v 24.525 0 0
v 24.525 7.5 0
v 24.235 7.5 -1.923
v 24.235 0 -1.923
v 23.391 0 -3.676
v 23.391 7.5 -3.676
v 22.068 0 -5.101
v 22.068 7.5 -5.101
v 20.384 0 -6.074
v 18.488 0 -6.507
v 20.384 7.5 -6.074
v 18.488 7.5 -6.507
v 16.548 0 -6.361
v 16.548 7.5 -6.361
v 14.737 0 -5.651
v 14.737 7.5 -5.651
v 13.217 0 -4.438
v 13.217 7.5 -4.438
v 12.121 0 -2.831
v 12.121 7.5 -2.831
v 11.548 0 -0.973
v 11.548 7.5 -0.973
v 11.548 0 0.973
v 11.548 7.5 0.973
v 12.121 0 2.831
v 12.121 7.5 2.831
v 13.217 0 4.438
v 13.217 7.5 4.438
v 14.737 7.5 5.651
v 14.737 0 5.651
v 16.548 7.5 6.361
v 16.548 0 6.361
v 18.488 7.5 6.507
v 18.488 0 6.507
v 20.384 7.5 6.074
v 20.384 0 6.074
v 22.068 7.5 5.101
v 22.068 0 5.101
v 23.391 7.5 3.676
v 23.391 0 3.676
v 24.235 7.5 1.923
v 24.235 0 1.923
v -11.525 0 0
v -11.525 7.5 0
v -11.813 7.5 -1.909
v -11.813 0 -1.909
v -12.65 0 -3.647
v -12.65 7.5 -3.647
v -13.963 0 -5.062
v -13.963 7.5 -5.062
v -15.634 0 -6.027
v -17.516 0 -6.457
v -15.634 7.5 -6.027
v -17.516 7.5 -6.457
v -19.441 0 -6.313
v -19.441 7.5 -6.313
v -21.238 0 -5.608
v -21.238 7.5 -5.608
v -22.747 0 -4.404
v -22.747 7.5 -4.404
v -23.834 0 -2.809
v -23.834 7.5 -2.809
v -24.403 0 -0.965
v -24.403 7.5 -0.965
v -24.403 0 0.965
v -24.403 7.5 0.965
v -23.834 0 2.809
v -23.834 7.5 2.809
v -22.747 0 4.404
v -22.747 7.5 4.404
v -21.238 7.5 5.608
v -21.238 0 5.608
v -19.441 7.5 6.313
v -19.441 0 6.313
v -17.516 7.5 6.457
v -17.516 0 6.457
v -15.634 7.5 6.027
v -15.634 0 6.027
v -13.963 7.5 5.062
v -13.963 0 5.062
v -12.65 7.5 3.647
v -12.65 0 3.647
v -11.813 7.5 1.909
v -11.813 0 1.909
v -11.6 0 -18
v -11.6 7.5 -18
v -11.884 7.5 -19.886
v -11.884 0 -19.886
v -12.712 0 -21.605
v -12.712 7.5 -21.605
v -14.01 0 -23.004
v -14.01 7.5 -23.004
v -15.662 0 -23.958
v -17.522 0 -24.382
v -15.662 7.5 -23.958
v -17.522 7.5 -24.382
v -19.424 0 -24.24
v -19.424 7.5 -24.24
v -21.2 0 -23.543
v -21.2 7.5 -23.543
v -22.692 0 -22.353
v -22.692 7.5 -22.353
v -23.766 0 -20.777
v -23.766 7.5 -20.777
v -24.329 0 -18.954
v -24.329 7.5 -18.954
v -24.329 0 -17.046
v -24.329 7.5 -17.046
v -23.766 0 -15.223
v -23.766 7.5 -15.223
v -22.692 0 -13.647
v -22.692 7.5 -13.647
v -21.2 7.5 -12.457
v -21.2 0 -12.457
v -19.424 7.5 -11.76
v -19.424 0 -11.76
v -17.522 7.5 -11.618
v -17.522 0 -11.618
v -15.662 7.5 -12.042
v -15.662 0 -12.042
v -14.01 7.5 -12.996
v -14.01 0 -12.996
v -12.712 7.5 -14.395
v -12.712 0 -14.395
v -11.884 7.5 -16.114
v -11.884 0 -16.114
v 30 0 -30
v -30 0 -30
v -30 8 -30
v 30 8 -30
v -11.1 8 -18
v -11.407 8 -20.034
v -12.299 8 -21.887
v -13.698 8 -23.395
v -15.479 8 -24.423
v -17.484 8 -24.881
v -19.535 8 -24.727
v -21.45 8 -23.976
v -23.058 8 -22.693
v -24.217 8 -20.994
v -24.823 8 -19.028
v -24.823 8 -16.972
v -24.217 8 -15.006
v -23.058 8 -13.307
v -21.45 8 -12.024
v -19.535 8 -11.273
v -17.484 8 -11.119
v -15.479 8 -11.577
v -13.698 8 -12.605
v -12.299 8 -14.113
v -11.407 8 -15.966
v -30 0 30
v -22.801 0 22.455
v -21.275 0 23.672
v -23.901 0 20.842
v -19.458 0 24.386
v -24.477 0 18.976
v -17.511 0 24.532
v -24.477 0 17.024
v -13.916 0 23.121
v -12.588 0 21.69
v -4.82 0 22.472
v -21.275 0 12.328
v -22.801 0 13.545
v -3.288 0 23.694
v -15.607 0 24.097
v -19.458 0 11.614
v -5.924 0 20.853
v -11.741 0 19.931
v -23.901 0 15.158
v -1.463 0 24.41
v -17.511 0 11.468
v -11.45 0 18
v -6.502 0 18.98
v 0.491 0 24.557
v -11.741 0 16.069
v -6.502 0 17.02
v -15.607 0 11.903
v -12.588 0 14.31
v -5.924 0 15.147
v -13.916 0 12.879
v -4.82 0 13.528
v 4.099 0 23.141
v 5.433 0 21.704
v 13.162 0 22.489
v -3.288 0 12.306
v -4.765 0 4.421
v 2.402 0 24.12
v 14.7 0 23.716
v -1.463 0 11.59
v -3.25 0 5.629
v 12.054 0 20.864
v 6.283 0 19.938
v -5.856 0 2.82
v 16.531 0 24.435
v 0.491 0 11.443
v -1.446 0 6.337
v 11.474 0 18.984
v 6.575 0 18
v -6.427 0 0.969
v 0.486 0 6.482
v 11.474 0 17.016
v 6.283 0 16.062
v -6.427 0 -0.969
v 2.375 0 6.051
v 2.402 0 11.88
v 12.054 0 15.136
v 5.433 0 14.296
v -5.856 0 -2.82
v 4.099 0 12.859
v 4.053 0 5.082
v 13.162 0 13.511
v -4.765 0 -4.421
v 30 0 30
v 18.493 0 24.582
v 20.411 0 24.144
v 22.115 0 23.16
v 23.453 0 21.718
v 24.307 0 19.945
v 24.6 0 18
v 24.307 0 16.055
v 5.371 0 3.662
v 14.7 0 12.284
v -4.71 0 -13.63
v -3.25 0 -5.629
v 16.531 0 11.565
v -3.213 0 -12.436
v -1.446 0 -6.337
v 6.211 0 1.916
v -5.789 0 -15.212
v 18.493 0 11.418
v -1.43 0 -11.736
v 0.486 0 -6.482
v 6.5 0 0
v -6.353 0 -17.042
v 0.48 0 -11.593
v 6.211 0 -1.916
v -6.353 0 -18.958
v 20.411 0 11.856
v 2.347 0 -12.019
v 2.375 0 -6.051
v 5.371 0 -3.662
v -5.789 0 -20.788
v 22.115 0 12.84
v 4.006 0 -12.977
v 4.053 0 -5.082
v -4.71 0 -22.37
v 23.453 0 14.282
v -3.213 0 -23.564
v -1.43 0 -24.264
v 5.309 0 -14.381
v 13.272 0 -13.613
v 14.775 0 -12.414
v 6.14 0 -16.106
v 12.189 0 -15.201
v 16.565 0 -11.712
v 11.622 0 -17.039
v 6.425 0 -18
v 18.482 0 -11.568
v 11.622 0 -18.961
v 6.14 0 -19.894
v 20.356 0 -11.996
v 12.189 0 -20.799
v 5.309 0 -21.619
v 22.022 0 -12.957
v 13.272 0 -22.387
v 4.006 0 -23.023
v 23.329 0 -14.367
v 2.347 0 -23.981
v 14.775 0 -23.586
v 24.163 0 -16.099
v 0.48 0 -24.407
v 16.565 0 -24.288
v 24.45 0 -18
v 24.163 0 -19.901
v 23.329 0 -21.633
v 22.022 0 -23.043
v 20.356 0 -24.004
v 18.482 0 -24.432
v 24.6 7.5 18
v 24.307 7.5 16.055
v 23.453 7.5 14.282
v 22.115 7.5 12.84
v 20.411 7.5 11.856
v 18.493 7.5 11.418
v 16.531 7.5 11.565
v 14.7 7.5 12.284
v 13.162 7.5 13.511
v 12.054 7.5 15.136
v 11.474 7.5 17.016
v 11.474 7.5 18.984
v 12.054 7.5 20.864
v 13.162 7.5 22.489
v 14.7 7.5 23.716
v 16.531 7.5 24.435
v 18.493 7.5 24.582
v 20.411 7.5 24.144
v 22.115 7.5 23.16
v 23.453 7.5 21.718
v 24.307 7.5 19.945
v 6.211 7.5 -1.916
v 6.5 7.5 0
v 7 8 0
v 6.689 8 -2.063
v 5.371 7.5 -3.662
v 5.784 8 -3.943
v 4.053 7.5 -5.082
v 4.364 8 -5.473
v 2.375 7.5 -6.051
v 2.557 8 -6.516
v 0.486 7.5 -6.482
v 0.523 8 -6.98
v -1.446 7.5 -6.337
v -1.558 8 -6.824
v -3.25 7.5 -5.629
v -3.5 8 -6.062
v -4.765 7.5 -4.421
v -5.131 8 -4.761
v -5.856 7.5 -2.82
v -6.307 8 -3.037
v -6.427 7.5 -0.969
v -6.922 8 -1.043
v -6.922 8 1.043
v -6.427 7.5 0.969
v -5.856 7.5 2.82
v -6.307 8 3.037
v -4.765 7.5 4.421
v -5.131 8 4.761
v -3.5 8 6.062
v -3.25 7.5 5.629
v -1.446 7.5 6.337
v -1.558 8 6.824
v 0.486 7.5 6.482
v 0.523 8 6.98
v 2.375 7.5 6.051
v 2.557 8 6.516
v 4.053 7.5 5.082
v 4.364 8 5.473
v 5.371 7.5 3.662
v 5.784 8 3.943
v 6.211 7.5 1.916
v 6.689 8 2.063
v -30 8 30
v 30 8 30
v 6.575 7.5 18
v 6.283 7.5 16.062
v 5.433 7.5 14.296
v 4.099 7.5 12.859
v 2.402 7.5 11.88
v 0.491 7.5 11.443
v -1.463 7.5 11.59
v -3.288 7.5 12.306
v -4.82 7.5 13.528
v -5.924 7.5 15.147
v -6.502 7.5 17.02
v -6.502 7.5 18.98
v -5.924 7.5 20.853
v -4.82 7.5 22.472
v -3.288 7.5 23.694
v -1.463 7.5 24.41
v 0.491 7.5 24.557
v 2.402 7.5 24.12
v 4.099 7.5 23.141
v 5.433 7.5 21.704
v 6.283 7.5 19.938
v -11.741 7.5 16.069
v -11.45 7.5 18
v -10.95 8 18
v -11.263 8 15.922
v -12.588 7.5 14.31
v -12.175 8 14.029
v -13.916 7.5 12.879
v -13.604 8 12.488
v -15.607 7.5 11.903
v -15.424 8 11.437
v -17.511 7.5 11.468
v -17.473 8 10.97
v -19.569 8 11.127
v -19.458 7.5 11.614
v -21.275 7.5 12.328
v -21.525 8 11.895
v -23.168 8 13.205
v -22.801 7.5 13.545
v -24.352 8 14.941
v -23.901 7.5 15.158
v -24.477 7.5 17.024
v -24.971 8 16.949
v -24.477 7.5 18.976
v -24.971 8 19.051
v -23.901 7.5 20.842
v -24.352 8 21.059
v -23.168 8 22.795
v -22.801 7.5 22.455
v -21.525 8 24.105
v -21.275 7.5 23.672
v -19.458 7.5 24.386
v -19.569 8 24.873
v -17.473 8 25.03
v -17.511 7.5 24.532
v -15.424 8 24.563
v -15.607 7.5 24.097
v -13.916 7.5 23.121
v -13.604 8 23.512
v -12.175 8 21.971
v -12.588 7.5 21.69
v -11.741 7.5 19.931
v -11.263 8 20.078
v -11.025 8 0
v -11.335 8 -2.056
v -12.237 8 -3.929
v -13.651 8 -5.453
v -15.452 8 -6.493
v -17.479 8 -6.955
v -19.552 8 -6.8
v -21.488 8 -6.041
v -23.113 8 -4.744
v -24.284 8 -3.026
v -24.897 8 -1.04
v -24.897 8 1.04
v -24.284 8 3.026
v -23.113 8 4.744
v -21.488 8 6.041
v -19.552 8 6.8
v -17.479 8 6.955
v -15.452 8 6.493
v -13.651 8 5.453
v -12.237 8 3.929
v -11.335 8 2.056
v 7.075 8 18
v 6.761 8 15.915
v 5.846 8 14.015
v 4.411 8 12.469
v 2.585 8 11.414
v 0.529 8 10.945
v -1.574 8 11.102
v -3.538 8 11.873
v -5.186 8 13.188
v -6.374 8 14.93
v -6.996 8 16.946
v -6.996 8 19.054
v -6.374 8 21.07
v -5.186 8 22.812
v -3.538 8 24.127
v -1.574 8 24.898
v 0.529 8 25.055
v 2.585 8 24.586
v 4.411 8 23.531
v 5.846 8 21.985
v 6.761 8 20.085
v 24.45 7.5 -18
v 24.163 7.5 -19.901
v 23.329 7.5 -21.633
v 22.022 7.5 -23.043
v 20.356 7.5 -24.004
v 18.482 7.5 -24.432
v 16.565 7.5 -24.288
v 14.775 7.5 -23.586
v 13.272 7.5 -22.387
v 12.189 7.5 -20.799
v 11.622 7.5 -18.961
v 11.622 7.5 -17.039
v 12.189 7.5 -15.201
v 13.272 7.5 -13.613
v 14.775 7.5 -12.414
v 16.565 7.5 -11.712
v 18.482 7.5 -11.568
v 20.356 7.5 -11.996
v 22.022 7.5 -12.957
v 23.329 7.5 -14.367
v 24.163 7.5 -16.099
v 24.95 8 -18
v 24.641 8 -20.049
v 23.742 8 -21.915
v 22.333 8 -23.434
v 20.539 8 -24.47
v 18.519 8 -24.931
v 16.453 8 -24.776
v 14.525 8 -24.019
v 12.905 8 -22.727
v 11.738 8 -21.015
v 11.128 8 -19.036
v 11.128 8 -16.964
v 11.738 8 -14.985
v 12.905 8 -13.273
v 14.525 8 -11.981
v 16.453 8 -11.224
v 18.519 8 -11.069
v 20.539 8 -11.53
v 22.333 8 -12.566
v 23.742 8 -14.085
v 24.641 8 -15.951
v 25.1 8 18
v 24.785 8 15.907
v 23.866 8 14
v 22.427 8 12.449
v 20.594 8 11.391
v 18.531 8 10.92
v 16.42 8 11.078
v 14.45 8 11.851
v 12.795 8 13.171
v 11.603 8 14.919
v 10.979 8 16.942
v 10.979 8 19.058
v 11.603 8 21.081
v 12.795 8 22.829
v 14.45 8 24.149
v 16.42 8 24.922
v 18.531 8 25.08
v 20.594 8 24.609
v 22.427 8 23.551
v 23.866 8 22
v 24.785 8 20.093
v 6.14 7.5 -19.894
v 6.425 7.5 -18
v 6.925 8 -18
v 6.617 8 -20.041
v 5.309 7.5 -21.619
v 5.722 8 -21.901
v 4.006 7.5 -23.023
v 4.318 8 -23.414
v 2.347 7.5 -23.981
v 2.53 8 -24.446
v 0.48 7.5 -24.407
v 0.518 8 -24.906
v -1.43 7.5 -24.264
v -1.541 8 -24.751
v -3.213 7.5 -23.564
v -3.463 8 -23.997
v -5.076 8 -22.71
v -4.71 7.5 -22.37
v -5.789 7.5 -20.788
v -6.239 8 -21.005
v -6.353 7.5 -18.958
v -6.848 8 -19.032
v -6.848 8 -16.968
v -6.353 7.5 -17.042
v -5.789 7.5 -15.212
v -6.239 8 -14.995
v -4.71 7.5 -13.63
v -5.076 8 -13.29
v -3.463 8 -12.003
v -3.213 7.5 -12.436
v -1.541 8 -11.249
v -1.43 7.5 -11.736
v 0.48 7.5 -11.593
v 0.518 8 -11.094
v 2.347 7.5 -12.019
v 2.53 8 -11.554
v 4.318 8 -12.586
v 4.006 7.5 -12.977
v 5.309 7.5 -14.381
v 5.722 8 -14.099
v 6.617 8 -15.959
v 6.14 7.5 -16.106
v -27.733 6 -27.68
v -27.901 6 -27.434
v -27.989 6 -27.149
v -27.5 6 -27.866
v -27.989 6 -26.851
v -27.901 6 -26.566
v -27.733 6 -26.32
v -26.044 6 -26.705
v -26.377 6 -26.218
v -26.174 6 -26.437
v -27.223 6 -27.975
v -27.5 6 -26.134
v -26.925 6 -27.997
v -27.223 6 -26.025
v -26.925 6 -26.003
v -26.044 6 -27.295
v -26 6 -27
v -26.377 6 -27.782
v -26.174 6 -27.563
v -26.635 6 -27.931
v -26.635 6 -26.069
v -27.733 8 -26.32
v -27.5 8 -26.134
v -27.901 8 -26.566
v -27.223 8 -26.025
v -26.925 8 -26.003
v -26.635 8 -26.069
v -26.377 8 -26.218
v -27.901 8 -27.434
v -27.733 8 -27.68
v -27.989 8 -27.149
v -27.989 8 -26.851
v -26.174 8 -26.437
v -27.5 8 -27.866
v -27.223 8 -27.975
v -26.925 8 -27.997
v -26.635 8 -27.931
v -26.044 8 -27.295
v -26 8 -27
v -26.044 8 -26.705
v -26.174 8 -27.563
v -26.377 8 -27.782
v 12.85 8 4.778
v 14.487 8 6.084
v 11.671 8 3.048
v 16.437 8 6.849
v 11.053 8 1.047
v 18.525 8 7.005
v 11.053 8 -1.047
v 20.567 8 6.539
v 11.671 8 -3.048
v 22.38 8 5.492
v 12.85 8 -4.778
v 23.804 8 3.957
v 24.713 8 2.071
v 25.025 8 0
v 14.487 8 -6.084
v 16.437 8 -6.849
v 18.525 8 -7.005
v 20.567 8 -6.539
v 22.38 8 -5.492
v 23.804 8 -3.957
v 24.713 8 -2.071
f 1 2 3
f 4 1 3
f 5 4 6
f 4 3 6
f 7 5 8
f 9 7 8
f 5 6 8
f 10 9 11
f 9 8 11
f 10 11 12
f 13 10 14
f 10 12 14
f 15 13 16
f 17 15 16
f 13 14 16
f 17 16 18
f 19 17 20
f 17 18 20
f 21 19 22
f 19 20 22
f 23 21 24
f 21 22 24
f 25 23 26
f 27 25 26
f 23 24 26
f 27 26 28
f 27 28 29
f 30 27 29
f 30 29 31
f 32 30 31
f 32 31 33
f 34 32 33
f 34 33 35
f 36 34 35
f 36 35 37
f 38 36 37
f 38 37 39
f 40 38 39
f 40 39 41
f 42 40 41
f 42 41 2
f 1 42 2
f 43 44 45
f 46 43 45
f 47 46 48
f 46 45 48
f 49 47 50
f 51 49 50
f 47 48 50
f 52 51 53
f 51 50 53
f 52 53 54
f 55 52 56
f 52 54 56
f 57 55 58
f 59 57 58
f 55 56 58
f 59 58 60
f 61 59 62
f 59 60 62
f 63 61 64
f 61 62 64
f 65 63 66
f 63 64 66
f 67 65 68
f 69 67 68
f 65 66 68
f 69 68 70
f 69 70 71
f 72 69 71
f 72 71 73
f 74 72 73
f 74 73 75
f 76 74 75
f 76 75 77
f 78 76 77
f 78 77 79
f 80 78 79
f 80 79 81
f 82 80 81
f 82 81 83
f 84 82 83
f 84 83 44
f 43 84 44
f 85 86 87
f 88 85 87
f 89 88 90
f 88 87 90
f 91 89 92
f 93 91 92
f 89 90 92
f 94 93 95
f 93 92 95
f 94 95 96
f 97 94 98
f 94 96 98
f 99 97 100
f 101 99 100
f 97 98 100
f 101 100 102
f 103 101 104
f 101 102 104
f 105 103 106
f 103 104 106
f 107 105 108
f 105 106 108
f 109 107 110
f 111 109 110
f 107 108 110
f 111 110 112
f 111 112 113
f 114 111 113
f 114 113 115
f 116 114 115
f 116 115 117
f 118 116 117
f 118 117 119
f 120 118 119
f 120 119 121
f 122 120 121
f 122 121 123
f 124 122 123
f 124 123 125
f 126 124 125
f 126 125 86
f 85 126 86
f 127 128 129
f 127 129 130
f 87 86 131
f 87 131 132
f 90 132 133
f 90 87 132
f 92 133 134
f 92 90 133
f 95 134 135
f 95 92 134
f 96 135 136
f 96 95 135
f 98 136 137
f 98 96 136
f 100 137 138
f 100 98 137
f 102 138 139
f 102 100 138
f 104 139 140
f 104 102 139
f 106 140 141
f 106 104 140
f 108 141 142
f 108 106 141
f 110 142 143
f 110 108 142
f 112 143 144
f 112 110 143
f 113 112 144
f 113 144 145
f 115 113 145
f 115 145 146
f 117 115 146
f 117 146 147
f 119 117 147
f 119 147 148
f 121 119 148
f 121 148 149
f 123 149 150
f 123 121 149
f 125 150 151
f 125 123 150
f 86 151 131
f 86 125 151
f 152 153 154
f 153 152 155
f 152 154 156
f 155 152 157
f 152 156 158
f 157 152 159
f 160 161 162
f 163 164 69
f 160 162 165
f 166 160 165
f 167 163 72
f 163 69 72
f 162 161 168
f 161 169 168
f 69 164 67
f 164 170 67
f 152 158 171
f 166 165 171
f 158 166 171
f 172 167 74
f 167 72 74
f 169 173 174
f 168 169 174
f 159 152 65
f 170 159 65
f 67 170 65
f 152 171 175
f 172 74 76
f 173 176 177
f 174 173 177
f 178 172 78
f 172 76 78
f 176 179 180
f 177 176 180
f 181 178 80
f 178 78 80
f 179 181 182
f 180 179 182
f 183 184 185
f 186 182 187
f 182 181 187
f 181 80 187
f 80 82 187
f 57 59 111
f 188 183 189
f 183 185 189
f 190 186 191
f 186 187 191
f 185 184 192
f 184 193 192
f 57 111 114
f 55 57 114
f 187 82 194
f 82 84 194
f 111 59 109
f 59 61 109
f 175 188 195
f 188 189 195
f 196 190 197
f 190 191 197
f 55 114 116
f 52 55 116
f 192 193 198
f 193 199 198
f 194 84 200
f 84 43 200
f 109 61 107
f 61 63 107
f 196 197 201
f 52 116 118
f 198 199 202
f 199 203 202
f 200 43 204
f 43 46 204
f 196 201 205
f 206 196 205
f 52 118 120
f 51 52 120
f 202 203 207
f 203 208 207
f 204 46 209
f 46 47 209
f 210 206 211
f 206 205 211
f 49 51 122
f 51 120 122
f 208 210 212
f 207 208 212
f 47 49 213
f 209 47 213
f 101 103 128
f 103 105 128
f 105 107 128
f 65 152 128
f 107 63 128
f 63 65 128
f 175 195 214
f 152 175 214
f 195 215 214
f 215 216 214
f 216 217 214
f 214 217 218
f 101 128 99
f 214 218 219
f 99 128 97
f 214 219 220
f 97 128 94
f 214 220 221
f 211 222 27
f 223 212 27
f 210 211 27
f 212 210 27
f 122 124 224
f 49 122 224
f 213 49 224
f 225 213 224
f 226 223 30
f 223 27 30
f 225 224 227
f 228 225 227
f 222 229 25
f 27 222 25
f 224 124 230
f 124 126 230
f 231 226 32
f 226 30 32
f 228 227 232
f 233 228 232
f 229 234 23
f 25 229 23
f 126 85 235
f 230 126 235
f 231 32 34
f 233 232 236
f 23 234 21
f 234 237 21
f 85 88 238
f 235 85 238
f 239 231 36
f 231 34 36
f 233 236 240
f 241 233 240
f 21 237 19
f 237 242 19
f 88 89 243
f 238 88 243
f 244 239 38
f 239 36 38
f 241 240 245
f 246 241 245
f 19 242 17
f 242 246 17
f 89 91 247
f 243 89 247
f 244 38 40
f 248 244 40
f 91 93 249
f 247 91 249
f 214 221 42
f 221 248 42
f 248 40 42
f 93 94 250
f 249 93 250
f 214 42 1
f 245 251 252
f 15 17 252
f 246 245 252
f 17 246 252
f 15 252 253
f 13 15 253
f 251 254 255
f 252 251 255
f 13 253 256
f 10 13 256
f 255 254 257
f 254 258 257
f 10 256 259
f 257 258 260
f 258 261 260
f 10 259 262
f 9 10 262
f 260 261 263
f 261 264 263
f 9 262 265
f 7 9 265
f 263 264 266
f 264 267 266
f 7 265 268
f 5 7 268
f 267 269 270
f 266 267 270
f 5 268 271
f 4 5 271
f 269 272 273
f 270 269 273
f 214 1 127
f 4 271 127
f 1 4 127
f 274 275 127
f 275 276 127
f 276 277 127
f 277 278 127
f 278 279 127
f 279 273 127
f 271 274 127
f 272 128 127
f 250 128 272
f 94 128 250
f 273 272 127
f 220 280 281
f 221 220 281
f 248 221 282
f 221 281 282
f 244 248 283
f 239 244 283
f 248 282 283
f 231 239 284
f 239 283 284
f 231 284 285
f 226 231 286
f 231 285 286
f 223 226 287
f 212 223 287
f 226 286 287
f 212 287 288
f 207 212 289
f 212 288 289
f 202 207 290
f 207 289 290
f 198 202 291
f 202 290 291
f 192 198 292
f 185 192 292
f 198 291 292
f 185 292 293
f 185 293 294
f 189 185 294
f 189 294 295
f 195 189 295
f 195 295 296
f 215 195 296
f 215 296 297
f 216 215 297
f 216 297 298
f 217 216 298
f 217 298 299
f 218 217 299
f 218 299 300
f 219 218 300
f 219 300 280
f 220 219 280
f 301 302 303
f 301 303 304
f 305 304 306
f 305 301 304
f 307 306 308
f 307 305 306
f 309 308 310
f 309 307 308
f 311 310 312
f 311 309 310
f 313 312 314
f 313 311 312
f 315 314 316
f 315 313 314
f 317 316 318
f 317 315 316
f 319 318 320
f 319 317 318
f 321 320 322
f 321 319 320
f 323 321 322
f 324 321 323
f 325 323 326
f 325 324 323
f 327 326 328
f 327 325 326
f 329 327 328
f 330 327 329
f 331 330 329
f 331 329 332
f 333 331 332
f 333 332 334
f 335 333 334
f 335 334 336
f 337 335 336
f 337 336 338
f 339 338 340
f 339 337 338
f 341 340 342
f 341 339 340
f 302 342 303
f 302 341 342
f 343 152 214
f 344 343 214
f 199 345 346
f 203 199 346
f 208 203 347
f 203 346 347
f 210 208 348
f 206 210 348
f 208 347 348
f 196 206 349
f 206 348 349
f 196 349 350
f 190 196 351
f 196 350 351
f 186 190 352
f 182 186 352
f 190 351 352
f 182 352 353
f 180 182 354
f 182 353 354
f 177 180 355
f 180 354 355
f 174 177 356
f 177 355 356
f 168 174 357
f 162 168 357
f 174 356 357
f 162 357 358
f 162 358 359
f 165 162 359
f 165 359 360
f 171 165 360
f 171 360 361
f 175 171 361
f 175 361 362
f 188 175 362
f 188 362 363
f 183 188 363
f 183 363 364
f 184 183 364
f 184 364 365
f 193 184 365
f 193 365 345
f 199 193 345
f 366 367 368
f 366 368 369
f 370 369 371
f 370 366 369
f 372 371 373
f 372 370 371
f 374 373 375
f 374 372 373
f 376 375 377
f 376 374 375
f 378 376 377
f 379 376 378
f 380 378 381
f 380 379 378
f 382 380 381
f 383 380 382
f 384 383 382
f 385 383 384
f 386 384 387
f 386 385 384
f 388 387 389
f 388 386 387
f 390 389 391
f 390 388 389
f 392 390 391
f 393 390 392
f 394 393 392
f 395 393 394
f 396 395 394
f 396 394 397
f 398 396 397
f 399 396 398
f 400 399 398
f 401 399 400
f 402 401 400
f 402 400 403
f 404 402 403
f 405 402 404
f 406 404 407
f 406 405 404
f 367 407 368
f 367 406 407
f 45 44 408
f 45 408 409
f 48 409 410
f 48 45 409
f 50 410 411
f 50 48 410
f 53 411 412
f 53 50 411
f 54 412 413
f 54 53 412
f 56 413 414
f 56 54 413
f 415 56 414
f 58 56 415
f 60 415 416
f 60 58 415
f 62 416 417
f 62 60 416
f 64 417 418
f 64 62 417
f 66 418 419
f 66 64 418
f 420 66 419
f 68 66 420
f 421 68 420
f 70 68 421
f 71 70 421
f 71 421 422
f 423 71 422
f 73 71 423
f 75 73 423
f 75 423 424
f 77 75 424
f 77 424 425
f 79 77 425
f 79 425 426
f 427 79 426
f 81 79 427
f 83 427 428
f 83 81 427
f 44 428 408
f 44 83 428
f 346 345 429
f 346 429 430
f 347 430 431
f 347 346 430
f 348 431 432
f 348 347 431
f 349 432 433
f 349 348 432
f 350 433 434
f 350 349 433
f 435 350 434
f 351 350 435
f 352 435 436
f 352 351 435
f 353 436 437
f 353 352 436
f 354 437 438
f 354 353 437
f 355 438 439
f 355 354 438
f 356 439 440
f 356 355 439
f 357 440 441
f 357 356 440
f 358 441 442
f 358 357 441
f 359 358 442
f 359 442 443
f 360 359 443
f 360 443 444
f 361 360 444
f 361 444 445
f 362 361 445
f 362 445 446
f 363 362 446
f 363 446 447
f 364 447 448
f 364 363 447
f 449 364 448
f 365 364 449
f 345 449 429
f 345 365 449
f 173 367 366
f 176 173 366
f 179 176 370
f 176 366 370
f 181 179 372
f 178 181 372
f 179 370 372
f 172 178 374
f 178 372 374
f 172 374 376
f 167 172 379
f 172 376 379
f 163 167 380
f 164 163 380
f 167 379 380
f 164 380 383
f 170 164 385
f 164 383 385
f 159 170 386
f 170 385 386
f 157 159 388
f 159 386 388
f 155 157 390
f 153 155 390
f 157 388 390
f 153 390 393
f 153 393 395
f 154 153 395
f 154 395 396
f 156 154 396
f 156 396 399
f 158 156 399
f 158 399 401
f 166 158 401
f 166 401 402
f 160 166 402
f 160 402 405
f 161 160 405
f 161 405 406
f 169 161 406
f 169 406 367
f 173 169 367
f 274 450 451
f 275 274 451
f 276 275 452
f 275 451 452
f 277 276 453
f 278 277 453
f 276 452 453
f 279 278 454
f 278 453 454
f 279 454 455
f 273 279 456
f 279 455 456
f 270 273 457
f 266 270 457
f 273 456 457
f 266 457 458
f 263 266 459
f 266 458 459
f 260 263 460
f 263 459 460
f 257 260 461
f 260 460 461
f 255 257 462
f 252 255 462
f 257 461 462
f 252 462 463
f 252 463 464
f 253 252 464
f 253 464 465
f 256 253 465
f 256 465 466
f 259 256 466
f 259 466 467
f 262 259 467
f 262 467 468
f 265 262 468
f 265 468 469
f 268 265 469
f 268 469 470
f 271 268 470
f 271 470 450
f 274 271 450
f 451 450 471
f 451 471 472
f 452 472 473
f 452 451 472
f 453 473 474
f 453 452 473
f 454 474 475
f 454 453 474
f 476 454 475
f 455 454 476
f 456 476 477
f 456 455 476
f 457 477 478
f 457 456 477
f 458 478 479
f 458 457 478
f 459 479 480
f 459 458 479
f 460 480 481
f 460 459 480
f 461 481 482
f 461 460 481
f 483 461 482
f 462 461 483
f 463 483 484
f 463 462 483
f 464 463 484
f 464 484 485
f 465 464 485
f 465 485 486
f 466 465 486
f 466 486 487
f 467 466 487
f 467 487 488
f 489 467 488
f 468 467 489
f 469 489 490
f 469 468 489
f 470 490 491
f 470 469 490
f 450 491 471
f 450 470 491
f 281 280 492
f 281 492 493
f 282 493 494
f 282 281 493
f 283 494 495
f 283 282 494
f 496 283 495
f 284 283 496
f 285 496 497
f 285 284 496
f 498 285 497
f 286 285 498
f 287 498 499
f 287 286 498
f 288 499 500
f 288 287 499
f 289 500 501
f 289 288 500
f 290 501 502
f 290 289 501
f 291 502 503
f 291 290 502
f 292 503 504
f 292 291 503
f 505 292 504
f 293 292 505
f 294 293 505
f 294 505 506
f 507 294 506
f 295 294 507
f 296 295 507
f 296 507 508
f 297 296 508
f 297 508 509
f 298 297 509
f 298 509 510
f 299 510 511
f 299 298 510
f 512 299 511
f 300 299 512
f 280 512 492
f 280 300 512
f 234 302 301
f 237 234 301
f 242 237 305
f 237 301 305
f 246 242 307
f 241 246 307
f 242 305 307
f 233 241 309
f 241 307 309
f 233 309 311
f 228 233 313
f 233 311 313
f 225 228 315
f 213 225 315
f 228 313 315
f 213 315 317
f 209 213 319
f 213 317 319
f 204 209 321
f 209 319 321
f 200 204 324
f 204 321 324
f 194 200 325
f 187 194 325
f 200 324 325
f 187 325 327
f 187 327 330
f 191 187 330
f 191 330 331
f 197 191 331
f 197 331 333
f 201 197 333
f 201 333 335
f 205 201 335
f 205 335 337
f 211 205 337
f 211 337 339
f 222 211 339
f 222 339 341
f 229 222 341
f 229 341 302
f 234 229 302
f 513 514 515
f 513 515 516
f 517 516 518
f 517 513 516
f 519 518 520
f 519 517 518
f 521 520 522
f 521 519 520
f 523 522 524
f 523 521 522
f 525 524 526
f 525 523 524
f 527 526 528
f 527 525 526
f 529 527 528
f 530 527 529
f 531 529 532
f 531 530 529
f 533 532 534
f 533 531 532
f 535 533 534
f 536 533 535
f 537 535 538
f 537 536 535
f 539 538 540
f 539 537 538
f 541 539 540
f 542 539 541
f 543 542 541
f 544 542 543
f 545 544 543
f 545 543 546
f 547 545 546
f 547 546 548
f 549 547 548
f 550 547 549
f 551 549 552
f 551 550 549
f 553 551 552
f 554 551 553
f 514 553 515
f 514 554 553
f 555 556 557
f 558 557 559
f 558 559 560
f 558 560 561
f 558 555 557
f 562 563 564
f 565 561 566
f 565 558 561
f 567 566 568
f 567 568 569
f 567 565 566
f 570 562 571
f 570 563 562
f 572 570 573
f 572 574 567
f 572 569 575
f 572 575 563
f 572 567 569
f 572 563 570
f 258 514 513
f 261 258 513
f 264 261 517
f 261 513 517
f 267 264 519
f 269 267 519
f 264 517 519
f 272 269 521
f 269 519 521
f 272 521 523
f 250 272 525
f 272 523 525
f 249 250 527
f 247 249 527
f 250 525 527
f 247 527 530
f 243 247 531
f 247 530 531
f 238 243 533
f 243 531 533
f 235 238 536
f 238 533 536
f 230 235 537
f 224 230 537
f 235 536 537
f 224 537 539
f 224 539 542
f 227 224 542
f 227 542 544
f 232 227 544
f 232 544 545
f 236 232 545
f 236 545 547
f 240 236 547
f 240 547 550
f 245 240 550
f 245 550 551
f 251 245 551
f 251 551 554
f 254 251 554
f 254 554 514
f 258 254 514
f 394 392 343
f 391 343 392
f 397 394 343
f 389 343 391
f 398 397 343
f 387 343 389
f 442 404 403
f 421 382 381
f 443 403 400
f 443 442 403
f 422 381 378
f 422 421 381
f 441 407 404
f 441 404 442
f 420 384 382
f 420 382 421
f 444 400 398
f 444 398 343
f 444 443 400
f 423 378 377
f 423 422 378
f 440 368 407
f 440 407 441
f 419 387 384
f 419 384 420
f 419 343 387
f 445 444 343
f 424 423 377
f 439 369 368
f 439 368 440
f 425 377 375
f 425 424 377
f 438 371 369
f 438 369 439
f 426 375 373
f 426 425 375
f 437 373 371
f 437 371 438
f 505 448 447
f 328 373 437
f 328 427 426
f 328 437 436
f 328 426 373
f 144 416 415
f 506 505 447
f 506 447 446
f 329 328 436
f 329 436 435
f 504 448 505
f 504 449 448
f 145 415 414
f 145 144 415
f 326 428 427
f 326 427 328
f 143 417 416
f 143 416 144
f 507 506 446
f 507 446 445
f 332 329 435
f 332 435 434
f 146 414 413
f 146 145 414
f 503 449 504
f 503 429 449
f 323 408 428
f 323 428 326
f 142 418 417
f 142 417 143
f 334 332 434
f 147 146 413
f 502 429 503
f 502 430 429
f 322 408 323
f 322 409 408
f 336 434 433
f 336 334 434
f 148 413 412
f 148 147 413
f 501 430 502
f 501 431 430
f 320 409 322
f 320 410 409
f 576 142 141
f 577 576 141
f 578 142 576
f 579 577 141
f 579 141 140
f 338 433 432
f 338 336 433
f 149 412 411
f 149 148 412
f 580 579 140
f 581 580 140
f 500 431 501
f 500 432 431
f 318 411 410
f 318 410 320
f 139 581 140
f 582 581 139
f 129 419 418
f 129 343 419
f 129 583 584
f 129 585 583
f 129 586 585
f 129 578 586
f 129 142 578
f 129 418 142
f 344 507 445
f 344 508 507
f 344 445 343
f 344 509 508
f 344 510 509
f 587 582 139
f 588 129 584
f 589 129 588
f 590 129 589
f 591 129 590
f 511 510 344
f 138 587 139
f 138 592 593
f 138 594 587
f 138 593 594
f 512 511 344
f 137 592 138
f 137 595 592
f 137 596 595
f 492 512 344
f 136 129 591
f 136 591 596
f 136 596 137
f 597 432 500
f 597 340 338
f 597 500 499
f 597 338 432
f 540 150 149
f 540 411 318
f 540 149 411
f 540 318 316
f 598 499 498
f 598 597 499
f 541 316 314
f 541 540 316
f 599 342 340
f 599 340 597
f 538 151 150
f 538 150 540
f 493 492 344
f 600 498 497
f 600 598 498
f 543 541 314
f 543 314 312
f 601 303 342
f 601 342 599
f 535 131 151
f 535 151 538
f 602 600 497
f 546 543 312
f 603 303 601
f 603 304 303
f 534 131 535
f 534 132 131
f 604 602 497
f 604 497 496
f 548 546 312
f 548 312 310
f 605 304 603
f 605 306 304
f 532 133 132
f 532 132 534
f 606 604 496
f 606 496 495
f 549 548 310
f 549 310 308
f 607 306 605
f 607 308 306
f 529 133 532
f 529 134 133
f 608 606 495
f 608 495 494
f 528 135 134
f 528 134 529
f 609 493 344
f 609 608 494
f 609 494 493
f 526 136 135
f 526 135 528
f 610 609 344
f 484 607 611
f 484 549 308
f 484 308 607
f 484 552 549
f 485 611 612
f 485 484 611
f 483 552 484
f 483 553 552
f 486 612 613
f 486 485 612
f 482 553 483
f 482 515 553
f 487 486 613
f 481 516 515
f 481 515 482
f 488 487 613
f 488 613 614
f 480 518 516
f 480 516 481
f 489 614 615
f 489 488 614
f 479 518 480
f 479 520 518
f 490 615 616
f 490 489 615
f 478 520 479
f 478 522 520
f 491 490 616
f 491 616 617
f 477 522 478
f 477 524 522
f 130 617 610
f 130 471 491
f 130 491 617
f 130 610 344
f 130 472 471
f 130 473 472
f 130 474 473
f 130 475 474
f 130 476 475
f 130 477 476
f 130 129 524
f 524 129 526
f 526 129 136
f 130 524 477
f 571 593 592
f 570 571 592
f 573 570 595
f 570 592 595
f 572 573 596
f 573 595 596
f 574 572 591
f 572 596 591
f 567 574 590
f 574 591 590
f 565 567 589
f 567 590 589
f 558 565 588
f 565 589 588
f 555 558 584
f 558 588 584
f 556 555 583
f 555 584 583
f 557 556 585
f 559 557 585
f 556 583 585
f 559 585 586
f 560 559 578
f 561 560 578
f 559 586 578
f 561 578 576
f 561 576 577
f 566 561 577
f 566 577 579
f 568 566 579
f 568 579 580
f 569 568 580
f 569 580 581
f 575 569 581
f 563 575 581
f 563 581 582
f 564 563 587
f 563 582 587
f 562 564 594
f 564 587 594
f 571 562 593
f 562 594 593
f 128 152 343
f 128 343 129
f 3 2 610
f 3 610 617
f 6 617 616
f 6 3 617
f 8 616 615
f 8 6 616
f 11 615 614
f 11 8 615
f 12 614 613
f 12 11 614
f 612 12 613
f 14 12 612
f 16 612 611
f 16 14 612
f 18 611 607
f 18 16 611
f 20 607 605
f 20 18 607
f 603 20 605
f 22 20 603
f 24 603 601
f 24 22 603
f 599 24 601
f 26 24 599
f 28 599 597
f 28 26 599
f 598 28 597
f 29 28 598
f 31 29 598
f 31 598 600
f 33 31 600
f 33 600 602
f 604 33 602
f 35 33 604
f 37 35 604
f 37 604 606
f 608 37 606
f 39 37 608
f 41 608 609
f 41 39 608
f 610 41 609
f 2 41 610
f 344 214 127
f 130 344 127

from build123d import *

# Parameters (mm, degrees)
SKETCH1_W               = 60
SKETCH1_H               = 60
BOSS_EXTRUDE1_DEPTH     = 8
SKETCH3_R               = 6.4
SKETCH3_R_2             = 6.425
SKETCH3_R_3             = 6.45
SKETCH3_R_4             = 6.475
SKETCH3_R_5             = 6.5
SKETCH3_R_6             = 6.525
SKETCH3_R_7             = 6.55
SKETCH3_R_8             = 6.575
SKETCH3_R_9             = 6.6
CUT_EXTRUDE1_DEPTH      = 1
CUT_EXTRUDE1_DEPTH_BACK = 9
CHAMFER1_SIZE           = 0.5
SKETCH4_R               = 1
CUT_EXTRUDE2_DEPTH      = 1
CUT_EXTRUDE2_DEPTH_BACK = 2


with BuildPart() as part:
    # Sketch1 → Boss-Extrude1 (new body)
    with BuildSketch(Plane(origin=(0, 0, 0), x_dir=(1, 0, 0), z_dir=(0, 1, 0))):
        Rectangle(SKETCH1_W, SKETCH1_H)
    extrude(amount=BOSS_EXTRUDE1_DEPTH)

    # Sketch3 → Cut-Extrude1 (cut, two sides)
    with BuildSketch(Plane(origin=(0, 8, 0), x_dir=(1, 0, 0), z_dir=(0, 1, 0))) as cut_extrude1_sk:
        with Locations((-18, 18)):
            Circle(SKETCH3_R)
        with Locations((0, 18)):
            Circle(SKETCH3_R_2)
        with Locations((18, 18)):
            Circle(SKETCH3_R_3)
        with Locations((-18, 0)):
            Circle(SKETCH3_R_4)
        Circle(SKETCH3_R_5)
        with Locations((18, 0)):
            Circle(SKETCH3_R_6)
        with Locations((-18, -18)):
            Circle(SKETCH3_R_7)
        with Locations((0, -18)):
            Circle(SKETCH3_R_8)
        with Locations((18, -18)):
            Circle(SKETCH3_R_9)
    extrude(amount=CUT_EXTRUDE1_DEPTH, mode=Mode.SUBTRACT)
    extrude(cut_extrude1_sk.sketch, amount=-CUT_EXTRUDE1_DEPTH_BACK, mode=Mode.SUBTRACT)

    # Chamfer1
    chamfer1_edges = [part.edges().sort_by_distance(p)[0] for p in [
        (-6.425, 8, -18),
        (11.55, 8, -18),
        (-24.475, 8, 0),
        (-6.5, 8, 0),
        (-24.55, 8, 18),
        (11.4, 8, 18),
        (-6.575, 8, 18),
        (11.475, 8, 0),
        (-24.4, 8, -18),
    ]]
    chamfer(chamfer1_edges, length=CHAMFER1_SIZE)

    # Sketch4 → Cut-Extrude2 (cut, two sides)
    with BuildSketch(Plane(origin=(0, 8, 0), x_dir=(1, 0, 0), z_dir=(0, 1, 0))) as cut_extrude2_sk:
        with Locations((-27, 27)):
            Circle(SKETCH4_R)
    extrude(amount=CUT_EXTRUDE2_DEPTH, mode=Mode.SUBTRACT)
    extrude(cut_extrude2_sk.sketch, amount=-CUT_EXTRUDE2_DEPTH_BACK, mode=Mode.SUBTRACT)


solid = part.part
